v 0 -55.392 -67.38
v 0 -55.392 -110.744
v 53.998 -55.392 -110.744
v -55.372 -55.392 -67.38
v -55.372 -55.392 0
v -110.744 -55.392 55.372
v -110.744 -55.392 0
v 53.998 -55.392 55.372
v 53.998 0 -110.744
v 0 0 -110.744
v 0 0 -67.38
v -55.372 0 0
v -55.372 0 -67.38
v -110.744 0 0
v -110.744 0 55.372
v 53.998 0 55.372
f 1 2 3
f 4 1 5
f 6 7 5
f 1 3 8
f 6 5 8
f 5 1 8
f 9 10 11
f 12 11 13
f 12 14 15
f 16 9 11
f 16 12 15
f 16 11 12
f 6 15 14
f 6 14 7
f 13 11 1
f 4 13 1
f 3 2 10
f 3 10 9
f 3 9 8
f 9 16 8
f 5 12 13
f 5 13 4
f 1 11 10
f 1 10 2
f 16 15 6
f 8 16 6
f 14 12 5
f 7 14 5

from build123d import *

# Parameters (mm, degrees)
F0_W      = 53.9978221059
F0_H      = 55.3920306265
F1_DEPTH  = 55.372
F2_W      = 55.3920306265
F2_H      = 55.372
F3_DEPTH  = 55.372
F4_W      = 55.3920306265
F4_H      = 55.372
F5_DEPTH  = 55.372
F6_W      = 53.9978221059
F6_H      = 55.3920306265
F7_DEPTH  = 55.372
F8_W      = 53.9978221059
F8_H      = 55.3920306265
F9_DEPTH  = 55.372
F10_W     = 55.3920306265
F10_H     = 67.3803910613
F11_DEPTH = 55.372


with BuildPart() as f1:
    # F0 (on Top) → F1 (new body)
    with BuildSketch(Plane.XY):
        with Locations((26.9989110529, -27.6960153133)):
            Rectangle(F0_W, F0_H)
    extrude(amount=F1_DEPTH)

    # F2 (on face) → F3 (join)
    with BuildSketch(Plane(origin=(0, 0, 0), x_dir=(0, -1, 0), z_dir=(-1, 0, 0))):
        with Locations((27.6960153133, 27.686)):
            Rectangle(F2_W, F2_H)
    extrude(amount=F3_DEPTH)

    # F4 (on face) → F5 (join)
    with BuildSketch(Plane(origin=(-55.372, 0, 0), x_dir=(0, -1, 0), z_dir=(-1, 0, 0))):
        with Locations((27.6960153133, 27.686)):
            Rectangle(F4_W, F4_H)
    extrude(amount=F5_DEPTH)

    # F6 (on face) → F7 (join)
    with BuildSketch(Plane(origin=(0, 0, 0), x_dir=(1, 0, 0), z_dir=(0, 0, -1))):
        with Locations((26.9989110529, 27.6960153133)):
            Rectangle(F6_W, F6_H)
    extrude(amount=F7_DEPTH)

    # F8 (on face) → F9 (join)
    with BuildSketch(Plane(origin=(0, 0, -55.372), x_dir=(1, 0, 0), z_dir=(0, 0, -1))):
        with Locations((26.9989110529, 27.6960153133)):
            Rectangle(F8_W, F8_H)
    extrude(amount=F9_DEPTH)

    # F10 (on face) → F11 (join)
    with BuildSketch(Plane(origin=(0, 0, 0), x_dir=(0, -1, 0), z_dir=(-1, 0, 0))):
        with Locations((27.6960153133, -33.6901955307)):
            Rectangle(F10_W, F10_H)
    extrude(amount=F11_DEPTH)


solid = f1.part
